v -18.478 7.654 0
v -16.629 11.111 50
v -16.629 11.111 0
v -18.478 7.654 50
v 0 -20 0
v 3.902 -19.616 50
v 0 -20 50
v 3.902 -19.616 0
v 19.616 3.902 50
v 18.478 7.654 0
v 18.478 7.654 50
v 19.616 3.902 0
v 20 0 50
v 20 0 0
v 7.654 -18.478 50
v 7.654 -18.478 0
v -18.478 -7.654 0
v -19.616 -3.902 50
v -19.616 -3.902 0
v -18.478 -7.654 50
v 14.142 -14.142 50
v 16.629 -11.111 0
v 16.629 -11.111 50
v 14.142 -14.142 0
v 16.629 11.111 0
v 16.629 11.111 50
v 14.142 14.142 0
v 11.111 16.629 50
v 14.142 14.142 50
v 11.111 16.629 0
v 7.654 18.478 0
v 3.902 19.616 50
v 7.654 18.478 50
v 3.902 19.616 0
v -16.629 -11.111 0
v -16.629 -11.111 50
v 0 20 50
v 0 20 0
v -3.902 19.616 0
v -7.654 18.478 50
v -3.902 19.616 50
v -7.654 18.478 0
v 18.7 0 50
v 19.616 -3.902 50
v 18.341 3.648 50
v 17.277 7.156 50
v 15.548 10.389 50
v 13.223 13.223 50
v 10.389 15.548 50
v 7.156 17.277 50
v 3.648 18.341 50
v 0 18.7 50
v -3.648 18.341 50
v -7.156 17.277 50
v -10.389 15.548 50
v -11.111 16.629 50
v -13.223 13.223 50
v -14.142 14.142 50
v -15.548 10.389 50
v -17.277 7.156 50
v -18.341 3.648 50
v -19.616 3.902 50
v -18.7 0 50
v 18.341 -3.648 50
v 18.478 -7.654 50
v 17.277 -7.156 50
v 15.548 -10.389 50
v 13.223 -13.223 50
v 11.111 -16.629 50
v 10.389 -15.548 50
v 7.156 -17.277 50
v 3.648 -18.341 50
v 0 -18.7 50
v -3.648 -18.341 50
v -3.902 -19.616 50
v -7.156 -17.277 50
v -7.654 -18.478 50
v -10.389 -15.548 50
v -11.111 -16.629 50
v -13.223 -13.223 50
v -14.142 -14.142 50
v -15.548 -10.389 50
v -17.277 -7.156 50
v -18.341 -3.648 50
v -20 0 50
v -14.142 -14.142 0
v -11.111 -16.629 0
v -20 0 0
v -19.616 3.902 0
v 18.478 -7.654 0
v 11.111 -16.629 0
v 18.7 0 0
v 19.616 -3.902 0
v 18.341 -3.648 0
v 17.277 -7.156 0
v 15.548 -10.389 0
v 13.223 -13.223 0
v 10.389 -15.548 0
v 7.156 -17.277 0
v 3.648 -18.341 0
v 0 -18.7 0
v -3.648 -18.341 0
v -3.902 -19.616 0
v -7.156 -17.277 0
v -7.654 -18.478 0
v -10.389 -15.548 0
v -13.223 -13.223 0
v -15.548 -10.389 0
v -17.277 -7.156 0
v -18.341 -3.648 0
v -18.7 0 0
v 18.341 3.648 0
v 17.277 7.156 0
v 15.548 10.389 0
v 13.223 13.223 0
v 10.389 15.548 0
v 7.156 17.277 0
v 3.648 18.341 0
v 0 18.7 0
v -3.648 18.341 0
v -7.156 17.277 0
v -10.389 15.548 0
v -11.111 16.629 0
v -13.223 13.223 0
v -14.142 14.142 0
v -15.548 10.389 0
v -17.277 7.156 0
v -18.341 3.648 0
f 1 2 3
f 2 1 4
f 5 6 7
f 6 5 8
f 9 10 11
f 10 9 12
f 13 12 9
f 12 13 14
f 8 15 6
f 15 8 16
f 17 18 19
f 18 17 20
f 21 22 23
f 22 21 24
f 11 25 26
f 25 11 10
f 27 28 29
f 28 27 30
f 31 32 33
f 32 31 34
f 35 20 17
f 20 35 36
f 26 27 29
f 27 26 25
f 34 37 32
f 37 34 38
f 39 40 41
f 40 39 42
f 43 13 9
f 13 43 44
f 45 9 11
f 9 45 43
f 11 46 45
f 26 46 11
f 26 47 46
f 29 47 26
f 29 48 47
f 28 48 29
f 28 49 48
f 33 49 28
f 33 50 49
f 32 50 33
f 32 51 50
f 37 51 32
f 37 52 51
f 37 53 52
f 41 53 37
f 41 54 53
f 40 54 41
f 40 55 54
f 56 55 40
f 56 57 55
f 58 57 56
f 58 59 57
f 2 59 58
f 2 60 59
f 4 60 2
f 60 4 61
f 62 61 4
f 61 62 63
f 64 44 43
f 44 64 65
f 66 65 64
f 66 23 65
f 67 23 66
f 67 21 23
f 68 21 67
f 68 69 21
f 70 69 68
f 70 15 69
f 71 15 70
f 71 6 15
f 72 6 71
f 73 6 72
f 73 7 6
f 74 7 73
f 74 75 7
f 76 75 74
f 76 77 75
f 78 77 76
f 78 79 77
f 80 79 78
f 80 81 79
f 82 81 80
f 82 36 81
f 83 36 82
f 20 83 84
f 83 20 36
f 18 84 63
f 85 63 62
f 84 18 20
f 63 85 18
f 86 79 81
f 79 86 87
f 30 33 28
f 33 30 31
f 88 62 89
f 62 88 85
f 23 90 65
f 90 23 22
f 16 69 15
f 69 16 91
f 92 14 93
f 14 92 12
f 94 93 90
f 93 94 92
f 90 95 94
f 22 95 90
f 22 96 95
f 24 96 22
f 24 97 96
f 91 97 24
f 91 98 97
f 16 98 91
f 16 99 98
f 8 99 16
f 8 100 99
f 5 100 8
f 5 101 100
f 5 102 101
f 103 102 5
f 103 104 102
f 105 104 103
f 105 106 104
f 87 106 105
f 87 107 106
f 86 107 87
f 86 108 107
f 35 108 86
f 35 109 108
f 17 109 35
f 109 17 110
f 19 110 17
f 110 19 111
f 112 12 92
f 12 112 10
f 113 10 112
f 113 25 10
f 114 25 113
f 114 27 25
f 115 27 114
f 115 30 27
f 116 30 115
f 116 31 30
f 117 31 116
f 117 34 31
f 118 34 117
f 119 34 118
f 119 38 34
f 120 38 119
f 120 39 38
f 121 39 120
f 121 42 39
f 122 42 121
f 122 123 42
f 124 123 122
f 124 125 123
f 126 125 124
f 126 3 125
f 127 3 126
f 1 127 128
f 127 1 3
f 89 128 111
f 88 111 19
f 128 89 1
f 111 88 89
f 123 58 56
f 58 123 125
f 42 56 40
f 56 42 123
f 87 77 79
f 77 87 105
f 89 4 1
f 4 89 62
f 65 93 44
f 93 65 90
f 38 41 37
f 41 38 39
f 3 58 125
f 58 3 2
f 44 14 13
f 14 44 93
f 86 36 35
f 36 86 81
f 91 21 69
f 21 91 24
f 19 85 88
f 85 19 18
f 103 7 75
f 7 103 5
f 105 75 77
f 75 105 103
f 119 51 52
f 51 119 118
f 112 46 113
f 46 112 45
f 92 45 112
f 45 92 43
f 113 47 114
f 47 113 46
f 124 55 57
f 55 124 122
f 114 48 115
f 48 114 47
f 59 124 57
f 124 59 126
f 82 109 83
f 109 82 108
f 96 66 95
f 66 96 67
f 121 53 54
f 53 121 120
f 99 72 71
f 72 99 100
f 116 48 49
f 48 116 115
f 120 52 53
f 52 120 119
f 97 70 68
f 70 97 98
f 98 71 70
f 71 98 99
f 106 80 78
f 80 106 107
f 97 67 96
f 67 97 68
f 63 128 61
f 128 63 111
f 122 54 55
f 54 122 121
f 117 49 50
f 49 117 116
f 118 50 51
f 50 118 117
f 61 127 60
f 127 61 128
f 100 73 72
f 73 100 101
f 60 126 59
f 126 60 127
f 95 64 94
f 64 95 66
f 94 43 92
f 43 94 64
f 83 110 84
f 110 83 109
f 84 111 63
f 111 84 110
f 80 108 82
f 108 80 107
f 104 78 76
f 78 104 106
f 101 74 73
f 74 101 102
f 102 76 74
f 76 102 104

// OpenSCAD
$fn = 32;

// ----------------------------------------------------------------------
// Thin tube: 1.3 mm wall
// ----------------------------------------------------------------------

// --- parameters (mm) ---
tube_od = 40;             // outer diameter
tube_h = 50;              // height, Z
wall = 1.3;               // wall thickness

difference() {
  cylinder(h = tube_h, d = tube_od);
  translate([0, 0, -1]) cylinder(h = tube_h + 2, d = tube_od - 2 * wall);
}
